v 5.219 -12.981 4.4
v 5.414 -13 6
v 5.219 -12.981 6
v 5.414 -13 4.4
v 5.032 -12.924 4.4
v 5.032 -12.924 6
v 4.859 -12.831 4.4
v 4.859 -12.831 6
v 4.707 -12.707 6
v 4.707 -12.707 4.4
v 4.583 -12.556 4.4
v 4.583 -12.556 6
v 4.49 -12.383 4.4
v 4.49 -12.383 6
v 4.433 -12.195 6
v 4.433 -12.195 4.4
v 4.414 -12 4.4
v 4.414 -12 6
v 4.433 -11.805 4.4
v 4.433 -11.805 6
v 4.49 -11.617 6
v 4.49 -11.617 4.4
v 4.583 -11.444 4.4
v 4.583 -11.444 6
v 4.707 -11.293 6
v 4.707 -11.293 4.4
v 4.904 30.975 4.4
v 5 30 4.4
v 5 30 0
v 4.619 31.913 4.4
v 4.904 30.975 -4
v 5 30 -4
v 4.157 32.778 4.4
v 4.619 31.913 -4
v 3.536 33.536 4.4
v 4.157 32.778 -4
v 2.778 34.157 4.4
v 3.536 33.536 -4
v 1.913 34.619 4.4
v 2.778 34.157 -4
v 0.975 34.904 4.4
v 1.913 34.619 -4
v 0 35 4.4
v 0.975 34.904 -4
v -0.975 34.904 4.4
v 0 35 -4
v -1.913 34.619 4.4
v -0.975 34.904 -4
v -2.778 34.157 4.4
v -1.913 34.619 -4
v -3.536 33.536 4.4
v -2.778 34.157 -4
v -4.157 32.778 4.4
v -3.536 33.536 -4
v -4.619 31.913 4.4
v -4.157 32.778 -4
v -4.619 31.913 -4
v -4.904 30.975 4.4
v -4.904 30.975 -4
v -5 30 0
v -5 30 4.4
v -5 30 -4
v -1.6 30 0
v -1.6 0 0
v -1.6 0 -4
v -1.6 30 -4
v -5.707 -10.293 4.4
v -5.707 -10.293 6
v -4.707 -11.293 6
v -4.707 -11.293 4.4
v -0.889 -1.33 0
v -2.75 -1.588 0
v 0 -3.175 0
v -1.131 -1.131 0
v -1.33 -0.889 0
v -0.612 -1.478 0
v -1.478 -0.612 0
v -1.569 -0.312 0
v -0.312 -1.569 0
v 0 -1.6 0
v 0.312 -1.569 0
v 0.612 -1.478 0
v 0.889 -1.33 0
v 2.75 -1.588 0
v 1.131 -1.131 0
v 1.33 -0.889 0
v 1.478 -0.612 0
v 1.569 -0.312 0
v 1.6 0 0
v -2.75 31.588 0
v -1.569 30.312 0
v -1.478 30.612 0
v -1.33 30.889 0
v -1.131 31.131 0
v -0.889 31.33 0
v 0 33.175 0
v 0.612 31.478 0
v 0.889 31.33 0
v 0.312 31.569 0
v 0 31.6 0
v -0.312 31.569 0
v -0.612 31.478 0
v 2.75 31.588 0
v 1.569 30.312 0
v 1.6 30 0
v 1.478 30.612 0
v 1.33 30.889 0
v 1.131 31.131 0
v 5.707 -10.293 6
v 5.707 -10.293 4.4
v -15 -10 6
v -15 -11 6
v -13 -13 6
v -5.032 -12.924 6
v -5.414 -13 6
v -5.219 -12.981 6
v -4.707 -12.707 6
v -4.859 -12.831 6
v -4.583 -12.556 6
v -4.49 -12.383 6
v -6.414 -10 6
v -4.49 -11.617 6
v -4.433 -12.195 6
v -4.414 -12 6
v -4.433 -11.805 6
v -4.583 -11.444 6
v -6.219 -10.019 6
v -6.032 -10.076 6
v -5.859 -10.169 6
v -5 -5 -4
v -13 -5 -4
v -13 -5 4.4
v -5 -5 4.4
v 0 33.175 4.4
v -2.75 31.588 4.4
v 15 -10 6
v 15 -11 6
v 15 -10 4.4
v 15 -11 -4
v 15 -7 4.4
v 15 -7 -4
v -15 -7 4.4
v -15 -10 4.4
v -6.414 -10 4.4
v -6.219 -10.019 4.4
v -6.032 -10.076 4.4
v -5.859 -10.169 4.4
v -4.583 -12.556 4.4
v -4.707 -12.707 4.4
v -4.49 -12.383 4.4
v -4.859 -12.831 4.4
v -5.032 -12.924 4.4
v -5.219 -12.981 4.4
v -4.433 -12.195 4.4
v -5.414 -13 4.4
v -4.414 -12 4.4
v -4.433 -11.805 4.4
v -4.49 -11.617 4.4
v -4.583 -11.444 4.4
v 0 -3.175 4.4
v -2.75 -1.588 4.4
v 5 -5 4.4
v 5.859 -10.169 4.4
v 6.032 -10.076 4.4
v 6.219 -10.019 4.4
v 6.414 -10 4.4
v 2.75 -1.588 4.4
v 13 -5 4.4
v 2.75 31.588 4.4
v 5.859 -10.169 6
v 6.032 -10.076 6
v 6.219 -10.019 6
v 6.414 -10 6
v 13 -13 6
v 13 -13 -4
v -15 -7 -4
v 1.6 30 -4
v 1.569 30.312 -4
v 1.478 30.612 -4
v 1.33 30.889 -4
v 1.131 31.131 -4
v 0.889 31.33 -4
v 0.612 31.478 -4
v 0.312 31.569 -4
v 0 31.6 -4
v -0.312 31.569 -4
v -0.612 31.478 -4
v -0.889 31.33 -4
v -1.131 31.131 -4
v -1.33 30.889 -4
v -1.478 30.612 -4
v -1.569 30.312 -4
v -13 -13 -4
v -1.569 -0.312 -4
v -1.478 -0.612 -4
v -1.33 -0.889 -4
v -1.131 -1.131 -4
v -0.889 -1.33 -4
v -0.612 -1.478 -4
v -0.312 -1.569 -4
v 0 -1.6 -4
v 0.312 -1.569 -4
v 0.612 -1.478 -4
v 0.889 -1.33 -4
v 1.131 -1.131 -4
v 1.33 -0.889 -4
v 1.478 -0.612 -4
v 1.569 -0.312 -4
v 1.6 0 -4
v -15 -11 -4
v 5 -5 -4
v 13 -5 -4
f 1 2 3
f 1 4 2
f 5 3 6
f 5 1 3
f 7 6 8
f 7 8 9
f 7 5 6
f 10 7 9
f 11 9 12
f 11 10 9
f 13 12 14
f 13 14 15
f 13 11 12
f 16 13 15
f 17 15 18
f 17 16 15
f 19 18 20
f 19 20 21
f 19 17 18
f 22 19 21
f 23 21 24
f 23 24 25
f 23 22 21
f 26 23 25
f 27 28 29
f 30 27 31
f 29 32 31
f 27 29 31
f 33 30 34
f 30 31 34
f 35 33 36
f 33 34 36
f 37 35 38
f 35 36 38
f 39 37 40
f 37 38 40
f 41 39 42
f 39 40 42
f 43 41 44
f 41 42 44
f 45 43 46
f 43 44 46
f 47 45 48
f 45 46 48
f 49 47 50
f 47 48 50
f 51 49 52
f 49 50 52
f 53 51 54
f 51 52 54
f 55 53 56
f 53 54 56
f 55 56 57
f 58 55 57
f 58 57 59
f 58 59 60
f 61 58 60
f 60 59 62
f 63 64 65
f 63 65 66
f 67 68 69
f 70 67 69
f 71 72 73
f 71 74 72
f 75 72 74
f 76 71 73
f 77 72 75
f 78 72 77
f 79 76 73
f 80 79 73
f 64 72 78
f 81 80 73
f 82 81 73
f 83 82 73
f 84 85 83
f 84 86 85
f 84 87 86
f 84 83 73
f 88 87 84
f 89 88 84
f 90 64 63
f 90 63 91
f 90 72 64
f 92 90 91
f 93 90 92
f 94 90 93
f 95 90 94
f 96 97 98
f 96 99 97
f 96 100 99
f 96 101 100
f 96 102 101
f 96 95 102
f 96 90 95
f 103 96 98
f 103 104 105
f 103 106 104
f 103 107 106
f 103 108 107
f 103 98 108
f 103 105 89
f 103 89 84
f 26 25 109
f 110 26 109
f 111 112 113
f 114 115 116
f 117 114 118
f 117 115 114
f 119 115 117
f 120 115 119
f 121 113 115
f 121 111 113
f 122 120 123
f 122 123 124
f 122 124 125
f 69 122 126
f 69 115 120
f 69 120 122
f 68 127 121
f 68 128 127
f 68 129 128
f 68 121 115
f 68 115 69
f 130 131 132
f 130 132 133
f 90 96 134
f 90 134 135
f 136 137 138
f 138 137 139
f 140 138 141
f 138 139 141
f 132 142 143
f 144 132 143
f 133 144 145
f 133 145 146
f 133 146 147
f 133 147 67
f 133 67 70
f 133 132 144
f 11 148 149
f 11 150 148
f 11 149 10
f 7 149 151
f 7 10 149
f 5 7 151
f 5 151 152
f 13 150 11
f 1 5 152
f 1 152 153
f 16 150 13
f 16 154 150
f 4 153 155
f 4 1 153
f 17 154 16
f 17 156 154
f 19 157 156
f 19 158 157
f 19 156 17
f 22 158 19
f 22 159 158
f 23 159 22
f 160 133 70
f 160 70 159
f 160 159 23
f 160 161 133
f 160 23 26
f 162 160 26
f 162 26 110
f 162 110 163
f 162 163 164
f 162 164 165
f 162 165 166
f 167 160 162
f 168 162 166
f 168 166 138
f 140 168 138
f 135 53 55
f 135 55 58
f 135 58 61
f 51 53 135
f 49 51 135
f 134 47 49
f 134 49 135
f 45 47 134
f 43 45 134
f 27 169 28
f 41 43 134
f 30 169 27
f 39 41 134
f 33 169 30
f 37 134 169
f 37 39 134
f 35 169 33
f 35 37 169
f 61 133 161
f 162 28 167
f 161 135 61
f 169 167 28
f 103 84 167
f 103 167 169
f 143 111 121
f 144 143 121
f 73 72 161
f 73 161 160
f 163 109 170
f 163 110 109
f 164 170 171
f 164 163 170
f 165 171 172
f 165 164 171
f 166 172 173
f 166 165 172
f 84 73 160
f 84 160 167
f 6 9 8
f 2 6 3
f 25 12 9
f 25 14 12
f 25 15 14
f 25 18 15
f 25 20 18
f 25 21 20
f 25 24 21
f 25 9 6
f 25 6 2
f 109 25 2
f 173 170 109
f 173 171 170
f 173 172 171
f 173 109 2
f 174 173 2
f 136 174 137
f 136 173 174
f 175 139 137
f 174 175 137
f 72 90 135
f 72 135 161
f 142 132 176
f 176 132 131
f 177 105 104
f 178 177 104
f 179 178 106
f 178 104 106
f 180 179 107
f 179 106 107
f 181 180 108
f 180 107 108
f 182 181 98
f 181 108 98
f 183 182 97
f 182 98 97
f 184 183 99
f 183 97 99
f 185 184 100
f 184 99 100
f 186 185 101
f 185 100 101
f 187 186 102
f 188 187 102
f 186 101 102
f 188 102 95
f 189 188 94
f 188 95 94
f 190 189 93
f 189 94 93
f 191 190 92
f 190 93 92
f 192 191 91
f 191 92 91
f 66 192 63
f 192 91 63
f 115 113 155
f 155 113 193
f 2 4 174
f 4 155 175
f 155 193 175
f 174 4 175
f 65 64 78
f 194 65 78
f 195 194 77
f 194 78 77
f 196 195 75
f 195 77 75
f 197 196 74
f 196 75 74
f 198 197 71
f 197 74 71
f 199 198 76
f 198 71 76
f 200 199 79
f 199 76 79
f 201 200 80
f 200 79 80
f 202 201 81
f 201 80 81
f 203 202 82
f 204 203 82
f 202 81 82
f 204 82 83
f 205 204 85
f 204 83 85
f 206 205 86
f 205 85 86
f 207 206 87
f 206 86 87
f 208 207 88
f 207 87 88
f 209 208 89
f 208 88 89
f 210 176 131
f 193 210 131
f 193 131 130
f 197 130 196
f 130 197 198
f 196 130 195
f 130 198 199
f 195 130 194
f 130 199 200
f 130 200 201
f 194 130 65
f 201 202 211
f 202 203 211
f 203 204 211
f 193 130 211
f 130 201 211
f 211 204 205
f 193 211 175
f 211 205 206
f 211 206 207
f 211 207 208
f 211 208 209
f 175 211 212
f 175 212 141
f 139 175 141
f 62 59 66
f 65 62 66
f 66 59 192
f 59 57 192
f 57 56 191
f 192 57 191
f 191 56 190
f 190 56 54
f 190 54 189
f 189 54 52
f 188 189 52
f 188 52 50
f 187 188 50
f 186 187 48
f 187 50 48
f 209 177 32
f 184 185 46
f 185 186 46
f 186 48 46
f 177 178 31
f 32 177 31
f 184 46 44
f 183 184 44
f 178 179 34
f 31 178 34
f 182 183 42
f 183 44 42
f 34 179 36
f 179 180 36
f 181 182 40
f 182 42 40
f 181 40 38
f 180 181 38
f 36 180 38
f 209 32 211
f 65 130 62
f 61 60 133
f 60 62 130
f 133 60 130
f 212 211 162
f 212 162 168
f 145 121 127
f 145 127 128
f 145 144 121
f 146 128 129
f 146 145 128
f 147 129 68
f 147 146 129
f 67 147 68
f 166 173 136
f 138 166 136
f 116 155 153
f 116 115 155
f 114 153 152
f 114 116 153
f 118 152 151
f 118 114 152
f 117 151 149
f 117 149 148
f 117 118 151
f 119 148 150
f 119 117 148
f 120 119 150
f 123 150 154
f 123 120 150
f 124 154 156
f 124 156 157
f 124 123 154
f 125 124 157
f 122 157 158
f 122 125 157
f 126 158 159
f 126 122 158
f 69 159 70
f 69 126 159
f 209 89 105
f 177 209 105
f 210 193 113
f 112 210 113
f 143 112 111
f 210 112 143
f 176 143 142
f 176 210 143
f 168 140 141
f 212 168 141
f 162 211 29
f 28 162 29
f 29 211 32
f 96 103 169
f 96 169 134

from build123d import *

# Parameters (mm, degrees)
PAD_DEPTH    = 4
SKETCH001_W  = 30
SKETCH001_H  = 8
PAD001_DEPTH = 6
POCKET_DEPTH = 1.6
CHAMFER_SIZE = 2
FILLET_R     = 1
PAD002_DEPTH = 4.4


with BuildPart() as part:
    # Sketch → Pad (new body)
    with BuildSketch(Plane.XY):
        with BuildLine():
            ThreePointArc((5, 29.999999), (0, 35), (-5, 29.999999))
            Line((-5, -5), (-5, 29.999999))
            Line((-15, -5), (-5, -5))
            Line((-15, -5), (-15, -13))
            Line((-15, -13), (15, -13))
            Line((15, -13), (15, -5))
            Line((5, -5), (15, -5))
            Line((5, 29.999999), (5, -5))
        make_face()
        with BuildLine():
            ThreePointArc((-1.6, 0), (0, -1.6), (1.6, 0))
            Line((1.6, 0), (1.6, 30))
            ThreePointArc((1.6, 30), (0, 31.6), (-1.6, 30))
            Line((-1.6, 0), (-1.6, 30))
        make_face(mode=Mode.SUBTRACT)
    extrude(amount=-PAD_DEPTH)

    # Sketch001 → Pad001 (join)
    with BuildSketch(Plane.XY):
        with Locations((0, -9)):
            Rectangle(SKETCH001_W, SKETCH001_H)
    extrude(amount=PAD001_DEPTH)

    # Sketch002 → Pocket (cut)
    with BuildSketch(Plane.XY.offset(6)):
        Polygon((-6, -10), (0, -16), (6, -10), (22.322094, -10), (22.322094, -1.337342), (-21.139692, -1.337342), (-21.139692, -10), align=None)
    extrude(amount=-POCKET_DEPTH, mode=Mode.SUBTRACT)

    # Chamfer
    chamfer_edges = [part.edges().sort_by_distance(p)[0] for p in [
        (15, -5, 2.2),
        (15, -13, 3),
        (-15, -5, 2.2),
        (-15, -13, 3),
    ]]
    chamfer(chamfer_edges, length=CHAMFER_SIZE)

    # Fillet
    fillet_edges = [part.edges().sort_by_distance(p)[0] for p in [
        (-6, -10, 5.2),
        (-3, -13, 5.2),
        (6, -10, 5.2),
        (3, -13, 5.2),
    ]]
    fillet(fillet_edges, radius=FILLET_R)

    # Sketch003 → Pad002 (join)
    with BuildSketch(Plane.XY):
        with BuildLine():
            ThreePointArc((5, 29.999992), (4e-06, 35), (-5, 30))
            Line((-5, 30), (-5, -5))
            Line((-5, -5), (5, -5))
            Line((5, -5), (5, 29.999992))
        make_face()
        Polygon((-2.75, -1.587713), (0, -3.175426), (2.75, -1.587713), (2.75, 31.587713), (0, 33.175426), (-2.75, 31.587713), align=None, mode=Mode.SUBTRACT)
    extrude(amount=PAD002_DEPTH)


solid = part.part
